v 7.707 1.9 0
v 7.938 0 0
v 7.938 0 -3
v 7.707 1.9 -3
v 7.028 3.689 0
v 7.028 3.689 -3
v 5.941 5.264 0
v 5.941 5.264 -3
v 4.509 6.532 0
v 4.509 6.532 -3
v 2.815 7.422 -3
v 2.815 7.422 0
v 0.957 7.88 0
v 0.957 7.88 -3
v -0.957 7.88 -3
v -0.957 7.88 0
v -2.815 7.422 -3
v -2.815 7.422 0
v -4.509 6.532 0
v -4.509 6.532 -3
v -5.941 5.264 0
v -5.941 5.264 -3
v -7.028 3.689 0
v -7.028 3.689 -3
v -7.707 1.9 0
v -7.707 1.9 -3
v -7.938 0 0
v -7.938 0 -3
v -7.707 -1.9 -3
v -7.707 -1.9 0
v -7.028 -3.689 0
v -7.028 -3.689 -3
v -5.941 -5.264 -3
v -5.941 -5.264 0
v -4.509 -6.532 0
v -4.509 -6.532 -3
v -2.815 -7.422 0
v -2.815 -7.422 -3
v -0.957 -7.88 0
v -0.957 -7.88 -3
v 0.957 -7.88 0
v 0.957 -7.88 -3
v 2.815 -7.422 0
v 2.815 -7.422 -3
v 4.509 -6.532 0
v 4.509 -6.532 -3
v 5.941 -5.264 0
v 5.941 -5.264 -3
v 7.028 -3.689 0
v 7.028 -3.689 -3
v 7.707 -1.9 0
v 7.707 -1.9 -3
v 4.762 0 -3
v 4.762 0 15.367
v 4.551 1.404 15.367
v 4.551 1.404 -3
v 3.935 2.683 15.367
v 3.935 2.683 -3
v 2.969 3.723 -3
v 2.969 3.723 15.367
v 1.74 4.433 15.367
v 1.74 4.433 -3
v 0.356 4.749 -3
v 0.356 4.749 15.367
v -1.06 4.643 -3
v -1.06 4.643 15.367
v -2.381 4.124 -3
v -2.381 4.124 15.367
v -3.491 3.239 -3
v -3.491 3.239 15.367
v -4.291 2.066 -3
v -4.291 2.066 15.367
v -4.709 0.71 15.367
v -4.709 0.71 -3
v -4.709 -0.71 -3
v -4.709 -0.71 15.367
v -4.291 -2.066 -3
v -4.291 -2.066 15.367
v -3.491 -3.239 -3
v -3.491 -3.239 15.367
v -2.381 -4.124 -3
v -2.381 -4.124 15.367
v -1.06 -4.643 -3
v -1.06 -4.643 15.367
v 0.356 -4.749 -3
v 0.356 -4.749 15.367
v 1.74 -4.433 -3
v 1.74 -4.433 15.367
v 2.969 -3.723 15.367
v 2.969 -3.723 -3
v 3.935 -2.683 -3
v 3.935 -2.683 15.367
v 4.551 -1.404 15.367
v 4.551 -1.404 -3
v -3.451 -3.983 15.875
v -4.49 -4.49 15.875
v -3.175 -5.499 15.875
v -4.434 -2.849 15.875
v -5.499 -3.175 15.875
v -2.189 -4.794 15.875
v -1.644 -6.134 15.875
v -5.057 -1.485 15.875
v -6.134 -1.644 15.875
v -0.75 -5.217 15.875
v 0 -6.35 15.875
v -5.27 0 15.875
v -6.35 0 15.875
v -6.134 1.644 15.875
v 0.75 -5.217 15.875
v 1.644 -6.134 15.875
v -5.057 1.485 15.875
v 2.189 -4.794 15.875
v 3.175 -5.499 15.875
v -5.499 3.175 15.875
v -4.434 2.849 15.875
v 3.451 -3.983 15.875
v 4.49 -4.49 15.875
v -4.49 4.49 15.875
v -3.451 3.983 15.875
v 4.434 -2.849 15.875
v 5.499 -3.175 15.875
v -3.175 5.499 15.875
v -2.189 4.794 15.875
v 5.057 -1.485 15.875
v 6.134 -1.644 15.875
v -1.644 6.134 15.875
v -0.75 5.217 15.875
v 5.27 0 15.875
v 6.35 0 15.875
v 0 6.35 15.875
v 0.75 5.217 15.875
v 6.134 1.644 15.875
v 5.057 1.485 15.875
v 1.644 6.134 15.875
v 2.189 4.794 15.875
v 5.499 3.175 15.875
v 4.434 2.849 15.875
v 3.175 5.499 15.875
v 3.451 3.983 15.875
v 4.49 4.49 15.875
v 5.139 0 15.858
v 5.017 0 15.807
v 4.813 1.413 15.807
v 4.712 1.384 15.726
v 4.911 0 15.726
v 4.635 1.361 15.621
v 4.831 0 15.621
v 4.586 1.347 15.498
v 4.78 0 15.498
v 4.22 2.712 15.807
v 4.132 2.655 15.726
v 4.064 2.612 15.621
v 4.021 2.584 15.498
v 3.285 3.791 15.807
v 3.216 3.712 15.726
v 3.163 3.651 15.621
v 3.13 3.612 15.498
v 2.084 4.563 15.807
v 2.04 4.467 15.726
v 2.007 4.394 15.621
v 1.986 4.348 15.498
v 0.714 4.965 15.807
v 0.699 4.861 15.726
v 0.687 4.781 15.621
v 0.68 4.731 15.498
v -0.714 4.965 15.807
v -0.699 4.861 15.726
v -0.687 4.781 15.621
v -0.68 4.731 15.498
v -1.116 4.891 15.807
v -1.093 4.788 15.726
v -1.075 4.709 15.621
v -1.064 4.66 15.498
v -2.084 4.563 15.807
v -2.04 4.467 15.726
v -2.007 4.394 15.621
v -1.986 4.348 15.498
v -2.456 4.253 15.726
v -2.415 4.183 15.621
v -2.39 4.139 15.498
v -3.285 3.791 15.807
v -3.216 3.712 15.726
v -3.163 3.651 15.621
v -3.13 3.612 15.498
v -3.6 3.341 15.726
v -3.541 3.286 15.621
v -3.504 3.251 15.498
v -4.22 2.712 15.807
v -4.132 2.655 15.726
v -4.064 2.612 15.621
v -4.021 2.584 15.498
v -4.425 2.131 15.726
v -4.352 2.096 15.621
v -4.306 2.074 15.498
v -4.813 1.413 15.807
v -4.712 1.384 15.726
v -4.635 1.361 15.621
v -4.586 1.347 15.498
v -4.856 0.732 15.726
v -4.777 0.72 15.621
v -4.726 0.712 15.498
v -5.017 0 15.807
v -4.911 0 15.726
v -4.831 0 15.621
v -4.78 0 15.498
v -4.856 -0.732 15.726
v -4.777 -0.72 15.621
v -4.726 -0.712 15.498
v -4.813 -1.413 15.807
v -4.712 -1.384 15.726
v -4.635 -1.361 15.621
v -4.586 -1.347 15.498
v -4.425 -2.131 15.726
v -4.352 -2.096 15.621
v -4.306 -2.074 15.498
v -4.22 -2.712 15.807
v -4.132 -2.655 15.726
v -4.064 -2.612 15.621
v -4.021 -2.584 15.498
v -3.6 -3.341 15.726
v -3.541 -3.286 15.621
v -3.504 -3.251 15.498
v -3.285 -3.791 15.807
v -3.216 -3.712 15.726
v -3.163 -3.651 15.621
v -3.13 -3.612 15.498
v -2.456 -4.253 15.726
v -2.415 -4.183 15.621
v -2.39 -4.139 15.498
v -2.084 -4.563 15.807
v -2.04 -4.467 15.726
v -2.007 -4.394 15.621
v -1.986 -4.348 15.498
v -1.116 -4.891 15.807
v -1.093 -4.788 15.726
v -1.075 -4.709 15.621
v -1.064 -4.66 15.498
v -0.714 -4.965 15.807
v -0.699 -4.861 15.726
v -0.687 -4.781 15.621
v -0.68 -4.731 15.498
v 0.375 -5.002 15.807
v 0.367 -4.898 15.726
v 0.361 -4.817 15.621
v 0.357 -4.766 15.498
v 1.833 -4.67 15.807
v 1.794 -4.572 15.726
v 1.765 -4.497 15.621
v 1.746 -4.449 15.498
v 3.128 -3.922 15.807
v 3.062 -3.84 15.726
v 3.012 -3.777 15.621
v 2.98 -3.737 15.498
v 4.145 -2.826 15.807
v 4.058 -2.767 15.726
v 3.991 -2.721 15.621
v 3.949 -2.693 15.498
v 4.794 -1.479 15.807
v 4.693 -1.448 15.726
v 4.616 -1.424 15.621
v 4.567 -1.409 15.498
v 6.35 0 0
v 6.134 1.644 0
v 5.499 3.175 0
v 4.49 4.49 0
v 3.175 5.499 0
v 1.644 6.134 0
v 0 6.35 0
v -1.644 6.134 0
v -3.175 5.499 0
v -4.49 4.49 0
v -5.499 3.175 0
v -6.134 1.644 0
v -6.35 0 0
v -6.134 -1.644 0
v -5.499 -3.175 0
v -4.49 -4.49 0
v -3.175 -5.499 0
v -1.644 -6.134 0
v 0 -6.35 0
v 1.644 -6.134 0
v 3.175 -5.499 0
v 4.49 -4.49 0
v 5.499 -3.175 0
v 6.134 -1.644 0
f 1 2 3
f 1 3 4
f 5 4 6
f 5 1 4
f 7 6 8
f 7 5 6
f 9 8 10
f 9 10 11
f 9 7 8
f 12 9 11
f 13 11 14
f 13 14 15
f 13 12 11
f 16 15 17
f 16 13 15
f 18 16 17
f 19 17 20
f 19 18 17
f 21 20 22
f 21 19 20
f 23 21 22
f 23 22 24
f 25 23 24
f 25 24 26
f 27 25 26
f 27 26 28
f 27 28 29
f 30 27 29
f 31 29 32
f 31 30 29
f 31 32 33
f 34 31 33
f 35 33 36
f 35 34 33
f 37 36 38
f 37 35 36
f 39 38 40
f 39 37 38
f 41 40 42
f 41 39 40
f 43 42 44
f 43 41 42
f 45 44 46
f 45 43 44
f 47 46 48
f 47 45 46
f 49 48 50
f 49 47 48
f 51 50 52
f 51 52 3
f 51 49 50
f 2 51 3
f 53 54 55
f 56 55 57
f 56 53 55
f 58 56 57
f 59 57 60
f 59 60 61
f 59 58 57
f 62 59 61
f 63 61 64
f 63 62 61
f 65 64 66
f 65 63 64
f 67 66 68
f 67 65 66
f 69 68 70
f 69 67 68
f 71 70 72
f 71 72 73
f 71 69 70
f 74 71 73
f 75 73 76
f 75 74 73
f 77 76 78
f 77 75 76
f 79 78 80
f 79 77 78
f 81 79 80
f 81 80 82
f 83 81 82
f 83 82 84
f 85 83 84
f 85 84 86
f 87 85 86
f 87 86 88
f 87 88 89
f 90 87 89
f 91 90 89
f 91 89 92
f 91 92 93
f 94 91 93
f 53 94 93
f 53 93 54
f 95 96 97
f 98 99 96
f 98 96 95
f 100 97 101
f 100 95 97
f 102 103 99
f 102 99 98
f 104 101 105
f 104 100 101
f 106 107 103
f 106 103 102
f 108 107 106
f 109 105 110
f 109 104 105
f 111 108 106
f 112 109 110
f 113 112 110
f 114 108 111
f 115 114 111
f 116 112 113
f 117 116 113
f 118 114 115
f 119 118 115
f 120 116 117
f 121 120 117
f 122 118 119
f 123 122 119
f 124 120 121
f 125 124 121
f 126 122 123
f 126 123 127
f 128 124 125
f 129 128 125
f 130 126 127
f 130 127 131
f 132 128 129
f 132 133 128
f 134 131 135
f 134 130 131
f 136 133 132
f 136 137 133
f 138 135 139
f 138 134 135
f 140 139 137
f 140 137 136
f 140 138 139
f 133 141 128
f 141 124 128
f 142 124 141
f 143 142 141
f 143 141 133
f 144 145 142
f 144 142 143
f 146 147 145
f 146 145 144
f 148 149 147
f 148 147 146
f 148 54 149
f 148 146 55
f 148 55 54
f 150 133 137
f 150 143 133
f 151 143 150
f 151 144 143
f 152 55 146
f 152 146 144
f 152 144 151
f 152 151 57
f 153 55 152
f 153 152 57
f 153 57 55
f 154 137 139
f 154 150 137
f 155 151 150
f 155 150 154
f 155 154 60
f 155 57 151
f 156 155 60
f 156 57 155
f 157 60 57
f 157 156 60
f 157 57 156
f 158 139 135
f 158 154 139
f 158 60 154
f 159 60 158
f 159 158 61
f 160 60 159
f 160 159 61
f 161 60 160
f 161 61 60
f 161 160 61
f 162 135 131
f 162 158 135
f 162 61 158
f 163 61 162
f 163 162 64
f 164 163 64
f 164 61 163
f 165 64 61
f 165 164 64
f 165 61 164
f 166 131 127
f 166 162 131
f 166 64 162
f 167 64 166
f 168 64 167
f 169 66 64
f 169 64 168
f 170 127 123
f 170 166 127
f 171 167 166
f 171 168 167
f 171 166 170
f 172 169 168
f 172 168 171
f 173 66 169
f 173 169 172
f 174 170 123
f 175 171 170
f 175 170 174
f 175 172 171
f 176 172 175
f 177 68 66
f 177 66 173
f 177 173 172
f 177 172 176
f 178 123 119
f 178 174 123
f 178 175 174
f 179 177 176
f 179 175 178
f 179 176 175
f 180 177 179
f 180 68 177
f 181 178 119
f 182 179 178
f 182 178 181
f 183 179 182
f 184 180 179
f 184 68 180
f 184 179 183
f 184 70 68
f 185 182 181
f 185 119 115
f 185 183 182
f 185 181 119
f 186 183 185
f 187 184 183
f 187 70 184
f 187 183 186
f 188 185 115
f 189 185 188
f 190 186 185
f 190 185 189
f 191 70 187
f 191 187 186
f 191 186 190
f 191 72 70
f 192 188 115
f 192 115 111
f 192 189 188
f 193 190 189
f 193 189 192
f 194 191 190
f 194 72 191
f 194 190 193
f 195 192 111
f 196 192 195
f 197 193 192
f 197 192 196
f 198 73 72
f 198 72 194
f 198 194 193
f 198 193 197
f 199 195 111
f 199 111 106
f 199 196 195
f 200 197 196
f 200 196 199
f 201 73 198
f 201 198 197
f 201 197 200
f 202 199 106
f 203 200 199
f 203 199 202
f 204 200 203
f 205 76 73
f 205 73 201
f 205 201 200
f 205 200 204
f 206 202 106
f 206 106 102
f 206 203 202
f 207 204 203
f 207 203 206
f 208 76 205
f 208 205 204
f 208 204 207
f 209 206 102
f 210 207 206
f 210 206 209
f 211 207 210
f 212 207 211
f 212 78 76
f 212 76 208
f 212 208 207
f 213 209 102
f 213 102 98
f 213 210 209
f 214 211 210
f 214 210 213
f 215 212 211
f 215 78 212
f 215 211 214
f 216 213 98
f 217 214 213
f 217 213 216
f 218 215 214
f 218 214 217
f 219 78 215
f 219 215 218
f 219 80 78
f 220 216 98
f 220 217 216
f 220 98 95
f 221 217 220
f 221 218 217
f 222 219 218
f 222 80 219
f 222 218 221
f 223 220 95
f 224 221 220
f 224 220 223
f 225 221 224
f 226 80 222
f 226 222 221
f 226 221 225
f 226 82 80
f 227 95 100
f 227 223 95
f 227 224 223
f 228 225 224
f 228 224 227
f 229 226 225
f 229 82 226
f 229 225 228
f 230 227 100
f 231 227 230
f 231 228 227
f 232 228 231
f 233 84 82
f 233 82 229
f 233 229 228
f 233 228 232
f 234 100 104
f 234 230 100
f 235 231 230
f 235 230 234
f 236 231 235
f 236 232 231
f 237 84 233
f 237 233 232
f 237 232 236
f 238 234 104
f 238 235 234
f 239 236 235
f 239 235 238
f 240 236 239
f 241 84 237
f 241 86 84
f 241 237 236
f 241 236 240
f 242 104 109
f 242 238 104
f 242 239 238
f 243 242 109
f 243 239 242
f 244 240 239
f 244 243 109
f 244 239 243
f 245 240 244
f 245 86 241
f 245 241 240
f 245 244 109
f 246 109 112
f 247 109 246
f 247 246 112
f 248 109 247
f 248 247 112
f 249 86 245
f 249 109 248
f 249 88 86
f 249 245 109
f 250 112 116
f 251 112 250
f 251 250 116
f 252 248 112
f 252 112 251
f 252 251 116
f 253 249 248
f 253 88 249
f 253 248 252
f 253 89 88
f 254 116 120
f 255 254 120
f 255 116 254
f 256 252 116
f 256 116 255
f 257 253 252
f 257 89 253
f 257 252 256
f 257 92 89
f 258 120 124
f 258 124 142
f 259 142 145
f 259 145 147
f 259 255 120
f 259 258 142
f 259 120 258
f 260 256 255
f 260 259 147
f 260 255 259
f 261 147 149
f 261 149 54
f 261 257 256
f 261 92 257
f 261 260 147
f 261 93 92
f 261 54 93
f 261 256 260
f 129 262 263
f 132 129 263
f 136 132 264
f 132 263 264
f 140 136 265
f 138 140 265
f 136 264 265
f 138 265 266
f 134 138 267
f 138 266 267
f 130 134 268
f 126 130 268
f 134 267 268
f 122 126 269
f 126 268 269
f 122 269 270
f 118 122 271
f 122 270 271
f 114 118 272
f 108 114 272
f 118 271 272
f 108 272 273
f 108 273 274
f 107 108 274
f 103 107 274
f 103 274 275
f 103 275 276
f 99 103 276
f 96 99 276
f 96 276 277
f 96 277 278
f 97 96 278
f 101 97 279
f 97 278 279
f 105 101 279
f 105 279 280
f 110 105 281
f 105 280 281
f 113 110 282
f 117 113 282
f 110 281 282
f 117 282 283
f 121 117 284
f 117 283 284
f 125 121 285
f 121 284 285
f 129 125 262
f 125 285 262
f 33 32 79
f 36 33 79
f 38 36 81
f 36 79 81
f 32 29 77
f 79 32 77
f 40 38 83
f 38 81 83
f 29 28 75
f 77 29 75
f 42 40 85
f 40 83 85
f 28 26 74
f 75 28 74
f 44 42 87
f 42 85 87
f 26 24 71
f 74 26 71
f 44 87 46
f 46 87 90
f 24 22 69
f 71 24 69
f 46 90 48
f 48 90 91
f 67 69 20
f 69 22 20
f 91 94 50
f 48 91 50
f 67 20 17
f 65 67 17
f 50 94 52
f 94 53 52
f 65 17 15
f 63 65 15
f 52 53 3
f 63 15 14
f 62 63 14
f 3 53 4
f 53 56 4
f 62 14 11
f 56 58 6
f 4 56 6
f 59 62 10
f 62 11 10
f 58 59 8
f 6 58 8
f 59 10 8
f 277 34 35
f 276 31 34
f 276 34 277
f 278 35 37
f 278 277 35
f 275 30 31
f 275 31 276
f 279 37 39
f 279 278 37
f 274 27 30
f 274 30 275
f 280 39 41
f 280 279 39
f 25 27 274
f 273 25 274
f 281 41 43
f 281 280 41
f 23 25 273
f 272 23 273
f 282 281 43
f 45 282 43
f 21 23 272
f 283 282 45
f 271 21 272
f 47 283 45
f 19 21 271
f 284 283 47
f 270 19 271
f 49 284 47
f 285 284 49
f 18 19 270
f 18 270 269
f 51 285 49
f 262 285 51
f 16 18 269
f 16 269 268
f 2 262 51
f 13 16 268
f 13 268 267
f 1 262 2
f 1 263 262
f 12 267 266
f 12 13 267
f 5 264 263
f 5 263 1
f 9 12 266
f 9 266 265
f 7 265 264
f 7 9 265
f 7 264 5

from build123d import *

# Parameters (mm, degrees)
F0_R     = 7.9375
F0_R_2   = 6.35
F0_R_3   = 4.7625
F1_DEPTH = 3
F2_DEPTH = 15.875
F3_R     = 0.508


with BuildPart() as f1:
    # F0 (on Top) → F1 (new body)
    with BuildSketch(Plane.XY):
        Circle(F0_R)
        Circle(F0_R_2, mode=Mode.SUBTRACT)
        Circle(F0_R_2)
        Circle(F0_R_3, mode=Mode.SUBTRACT)
    extrude(amount=-F1_DEPTH)

    # F0 (on Top) → F2 (join)
    with BuildSketch(Plane.XY):
        Circle(F0_R_2)
        Circle(F0_R_3, mode=Mode.SUBTRACT)
    extrude(amount=F2_DEPTH)

    # F3
    f3_edges = [f1.edges().sort_by_distance(p)[0] for p in [
        (-4.7625, 0, 15.875),
    ]]
    fillet(f3_edges, radius=F3_R)


solid = f1.part
